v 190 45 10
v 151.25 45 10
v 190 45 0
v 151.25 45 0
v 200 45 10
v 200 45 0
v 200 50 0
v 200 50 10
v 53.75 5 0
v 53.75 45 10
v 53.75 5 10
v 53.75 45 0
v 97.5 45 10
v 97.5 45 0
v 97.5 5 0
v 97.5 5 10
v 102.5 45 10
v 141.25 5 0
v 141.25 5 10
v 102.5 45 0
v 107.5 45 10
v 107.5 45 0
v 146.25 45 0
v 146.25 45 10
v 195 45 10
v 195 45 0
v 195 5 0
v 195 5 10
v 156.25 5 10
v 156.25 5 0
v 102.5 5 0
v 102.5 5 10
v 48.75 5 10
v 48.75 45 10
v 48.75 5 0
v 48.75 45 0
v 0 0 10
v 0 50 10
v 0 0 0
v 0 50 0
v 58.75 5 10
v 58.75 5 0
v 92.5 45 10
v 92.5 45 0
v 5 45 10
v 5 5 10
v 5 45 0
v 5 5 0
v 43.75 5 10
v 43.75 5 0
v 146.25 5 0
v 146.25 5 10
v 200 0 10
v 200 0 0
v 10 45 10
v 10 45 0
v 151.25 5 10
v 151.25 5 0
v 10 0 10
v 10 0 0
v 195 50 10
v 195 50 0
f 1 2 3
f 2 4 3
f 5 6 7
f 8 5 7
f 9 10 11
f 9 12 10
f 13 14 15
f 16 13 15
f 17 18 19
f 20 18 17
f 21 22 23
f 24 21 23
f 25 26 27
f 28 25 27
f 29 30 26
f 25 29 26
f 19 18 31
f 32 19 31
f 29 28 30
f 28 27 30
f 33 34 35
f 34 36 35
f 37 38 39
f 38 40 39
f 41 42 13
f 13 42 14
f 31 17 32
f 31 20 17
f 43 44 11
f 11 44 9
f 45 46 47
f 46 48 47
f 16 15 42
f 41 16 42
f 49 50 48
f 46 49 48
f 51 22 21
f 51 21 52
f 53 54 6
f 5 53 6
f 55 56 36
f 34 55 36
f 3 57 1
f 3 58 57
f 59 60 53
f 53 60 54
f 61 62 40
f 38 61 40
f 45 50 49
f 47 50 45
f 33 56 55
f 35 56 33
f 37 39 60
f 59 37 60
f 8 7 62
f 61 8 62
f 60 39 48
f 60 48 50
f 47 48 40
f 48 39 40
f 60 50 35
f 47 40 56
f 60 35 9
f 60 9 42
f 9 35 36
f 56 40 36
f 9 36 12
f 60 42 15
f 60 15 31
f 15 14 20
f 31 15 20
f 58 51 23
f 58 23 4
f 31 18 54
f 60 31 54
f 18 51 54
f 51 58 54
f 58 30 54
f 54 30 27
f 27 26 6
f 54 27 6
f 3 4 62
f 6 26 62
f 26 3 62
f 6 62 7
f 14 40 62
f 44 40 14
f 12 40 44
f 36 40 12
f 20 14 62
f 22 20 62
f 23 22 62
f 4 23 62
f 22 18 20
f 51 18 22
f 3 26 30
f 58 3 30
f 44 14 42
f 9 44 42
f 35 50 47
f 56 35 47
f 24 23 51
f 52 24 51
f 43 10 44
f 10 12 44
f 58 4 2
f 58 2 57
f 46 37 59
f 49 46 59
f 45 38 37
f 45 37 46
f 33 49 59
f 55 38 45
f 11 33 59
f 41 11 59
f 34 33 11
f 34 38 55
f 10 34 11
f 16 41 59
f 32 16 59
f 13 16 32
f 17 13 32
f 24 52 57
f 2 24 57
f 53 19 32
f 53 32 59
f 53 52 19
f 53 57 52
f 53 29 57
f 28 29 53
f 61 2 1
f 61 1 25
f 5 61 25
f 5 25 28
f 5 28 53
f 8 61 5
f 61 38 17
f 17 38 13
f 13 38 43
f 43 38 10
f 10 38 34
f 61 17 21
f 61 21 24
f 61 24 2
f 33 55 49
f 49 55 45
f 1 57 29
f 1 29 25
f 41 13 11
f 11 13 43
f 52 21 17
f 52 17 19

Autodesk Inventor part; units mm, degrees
ref_plane "YZ Plane" through (0, 0, 0) normal (1, 0, 0) x (0, 1, 0)
ref_plane "XZ Plane" through (0, 0, 0) normal (0, 1, 0) x (-1, 0, 0)
ref_plane "XY Plane" through (0, 0, 0) normal (0, 0, 1) x (1, 0, 0)
sketch "Szkic1" plane through (0, 0, 0) normal (0, 0, 1) x (1, 0, 0)
  line L0 (0, 0) -> (200, 0)
  line L1 (0, 0) -> (200, 0)
  line L2 (200, 0) -> (200, 50)
  line L3 (200, 50) -> (0, 50)
  line L4 (0, 50) -> (0, 0)
  line L5 (0, 0) -> (10, 0)
  line L6 (200, 50) -> (195, 50)
  line L7 (200, 50) -> (200, 45)
  line L8 (200, 50) -> (195, 50)
  line L9 (200, 50) -> (200, 45)
  line L10 (195, 45) -> (195, 5)
  line L11 (195, 5) -> (156.25, 5)
  line L12 (5, 5) -> (5, 45)
  line L13 (102.5, 45) -> (102.5, 5)
  line L14 (97.5, 45) -> (97.5, 5)
  line L15 (53.75, 45) -> (53.75, 5)
  line L16 (48.75, 45) -> (48.75, 5)
  line L17 (151.25, 45) -> (151.25, 5)
  line L18 (146.25, 45) -> (146.25, 5)
  line L19 (10, 45) -> (48.75, 5)
  line L20 (43.75, 5) -> (5, 45)
  line L21 (58.75, 5) -> (97.5, 45)
  line L22 (92.5, 45) -> (53.75, 5)
  line L23 (107.5, 45) -> (146.25, 5)
  line L24 (141.25, 5) -> (102.5, 45)
  line L25 (156.25, 5) -> (195, 45)
  line L26 (151.25, 5) -> (190, 45)
  line L27 (10, 45) -> (48.75, 45)
  line L28 (53.75, 45) -> (92.5, 45)
  line L29 (107.5, 45) -> (146.25, 45)
  line L30 (151.25, 45) -> (190, 45)
  line L31 (43.75, 5) -> (5, 5)
  line L32 (97.5, 5) -> (58.75, 5)
  line L33 (141.25, 5) -> (102.5, 5)
  dimension "d2" = 50
extrude "Wyciągnięcie proste1" add sketch "Szkic1" along normal blind 10
properties part number "Kratownica"
